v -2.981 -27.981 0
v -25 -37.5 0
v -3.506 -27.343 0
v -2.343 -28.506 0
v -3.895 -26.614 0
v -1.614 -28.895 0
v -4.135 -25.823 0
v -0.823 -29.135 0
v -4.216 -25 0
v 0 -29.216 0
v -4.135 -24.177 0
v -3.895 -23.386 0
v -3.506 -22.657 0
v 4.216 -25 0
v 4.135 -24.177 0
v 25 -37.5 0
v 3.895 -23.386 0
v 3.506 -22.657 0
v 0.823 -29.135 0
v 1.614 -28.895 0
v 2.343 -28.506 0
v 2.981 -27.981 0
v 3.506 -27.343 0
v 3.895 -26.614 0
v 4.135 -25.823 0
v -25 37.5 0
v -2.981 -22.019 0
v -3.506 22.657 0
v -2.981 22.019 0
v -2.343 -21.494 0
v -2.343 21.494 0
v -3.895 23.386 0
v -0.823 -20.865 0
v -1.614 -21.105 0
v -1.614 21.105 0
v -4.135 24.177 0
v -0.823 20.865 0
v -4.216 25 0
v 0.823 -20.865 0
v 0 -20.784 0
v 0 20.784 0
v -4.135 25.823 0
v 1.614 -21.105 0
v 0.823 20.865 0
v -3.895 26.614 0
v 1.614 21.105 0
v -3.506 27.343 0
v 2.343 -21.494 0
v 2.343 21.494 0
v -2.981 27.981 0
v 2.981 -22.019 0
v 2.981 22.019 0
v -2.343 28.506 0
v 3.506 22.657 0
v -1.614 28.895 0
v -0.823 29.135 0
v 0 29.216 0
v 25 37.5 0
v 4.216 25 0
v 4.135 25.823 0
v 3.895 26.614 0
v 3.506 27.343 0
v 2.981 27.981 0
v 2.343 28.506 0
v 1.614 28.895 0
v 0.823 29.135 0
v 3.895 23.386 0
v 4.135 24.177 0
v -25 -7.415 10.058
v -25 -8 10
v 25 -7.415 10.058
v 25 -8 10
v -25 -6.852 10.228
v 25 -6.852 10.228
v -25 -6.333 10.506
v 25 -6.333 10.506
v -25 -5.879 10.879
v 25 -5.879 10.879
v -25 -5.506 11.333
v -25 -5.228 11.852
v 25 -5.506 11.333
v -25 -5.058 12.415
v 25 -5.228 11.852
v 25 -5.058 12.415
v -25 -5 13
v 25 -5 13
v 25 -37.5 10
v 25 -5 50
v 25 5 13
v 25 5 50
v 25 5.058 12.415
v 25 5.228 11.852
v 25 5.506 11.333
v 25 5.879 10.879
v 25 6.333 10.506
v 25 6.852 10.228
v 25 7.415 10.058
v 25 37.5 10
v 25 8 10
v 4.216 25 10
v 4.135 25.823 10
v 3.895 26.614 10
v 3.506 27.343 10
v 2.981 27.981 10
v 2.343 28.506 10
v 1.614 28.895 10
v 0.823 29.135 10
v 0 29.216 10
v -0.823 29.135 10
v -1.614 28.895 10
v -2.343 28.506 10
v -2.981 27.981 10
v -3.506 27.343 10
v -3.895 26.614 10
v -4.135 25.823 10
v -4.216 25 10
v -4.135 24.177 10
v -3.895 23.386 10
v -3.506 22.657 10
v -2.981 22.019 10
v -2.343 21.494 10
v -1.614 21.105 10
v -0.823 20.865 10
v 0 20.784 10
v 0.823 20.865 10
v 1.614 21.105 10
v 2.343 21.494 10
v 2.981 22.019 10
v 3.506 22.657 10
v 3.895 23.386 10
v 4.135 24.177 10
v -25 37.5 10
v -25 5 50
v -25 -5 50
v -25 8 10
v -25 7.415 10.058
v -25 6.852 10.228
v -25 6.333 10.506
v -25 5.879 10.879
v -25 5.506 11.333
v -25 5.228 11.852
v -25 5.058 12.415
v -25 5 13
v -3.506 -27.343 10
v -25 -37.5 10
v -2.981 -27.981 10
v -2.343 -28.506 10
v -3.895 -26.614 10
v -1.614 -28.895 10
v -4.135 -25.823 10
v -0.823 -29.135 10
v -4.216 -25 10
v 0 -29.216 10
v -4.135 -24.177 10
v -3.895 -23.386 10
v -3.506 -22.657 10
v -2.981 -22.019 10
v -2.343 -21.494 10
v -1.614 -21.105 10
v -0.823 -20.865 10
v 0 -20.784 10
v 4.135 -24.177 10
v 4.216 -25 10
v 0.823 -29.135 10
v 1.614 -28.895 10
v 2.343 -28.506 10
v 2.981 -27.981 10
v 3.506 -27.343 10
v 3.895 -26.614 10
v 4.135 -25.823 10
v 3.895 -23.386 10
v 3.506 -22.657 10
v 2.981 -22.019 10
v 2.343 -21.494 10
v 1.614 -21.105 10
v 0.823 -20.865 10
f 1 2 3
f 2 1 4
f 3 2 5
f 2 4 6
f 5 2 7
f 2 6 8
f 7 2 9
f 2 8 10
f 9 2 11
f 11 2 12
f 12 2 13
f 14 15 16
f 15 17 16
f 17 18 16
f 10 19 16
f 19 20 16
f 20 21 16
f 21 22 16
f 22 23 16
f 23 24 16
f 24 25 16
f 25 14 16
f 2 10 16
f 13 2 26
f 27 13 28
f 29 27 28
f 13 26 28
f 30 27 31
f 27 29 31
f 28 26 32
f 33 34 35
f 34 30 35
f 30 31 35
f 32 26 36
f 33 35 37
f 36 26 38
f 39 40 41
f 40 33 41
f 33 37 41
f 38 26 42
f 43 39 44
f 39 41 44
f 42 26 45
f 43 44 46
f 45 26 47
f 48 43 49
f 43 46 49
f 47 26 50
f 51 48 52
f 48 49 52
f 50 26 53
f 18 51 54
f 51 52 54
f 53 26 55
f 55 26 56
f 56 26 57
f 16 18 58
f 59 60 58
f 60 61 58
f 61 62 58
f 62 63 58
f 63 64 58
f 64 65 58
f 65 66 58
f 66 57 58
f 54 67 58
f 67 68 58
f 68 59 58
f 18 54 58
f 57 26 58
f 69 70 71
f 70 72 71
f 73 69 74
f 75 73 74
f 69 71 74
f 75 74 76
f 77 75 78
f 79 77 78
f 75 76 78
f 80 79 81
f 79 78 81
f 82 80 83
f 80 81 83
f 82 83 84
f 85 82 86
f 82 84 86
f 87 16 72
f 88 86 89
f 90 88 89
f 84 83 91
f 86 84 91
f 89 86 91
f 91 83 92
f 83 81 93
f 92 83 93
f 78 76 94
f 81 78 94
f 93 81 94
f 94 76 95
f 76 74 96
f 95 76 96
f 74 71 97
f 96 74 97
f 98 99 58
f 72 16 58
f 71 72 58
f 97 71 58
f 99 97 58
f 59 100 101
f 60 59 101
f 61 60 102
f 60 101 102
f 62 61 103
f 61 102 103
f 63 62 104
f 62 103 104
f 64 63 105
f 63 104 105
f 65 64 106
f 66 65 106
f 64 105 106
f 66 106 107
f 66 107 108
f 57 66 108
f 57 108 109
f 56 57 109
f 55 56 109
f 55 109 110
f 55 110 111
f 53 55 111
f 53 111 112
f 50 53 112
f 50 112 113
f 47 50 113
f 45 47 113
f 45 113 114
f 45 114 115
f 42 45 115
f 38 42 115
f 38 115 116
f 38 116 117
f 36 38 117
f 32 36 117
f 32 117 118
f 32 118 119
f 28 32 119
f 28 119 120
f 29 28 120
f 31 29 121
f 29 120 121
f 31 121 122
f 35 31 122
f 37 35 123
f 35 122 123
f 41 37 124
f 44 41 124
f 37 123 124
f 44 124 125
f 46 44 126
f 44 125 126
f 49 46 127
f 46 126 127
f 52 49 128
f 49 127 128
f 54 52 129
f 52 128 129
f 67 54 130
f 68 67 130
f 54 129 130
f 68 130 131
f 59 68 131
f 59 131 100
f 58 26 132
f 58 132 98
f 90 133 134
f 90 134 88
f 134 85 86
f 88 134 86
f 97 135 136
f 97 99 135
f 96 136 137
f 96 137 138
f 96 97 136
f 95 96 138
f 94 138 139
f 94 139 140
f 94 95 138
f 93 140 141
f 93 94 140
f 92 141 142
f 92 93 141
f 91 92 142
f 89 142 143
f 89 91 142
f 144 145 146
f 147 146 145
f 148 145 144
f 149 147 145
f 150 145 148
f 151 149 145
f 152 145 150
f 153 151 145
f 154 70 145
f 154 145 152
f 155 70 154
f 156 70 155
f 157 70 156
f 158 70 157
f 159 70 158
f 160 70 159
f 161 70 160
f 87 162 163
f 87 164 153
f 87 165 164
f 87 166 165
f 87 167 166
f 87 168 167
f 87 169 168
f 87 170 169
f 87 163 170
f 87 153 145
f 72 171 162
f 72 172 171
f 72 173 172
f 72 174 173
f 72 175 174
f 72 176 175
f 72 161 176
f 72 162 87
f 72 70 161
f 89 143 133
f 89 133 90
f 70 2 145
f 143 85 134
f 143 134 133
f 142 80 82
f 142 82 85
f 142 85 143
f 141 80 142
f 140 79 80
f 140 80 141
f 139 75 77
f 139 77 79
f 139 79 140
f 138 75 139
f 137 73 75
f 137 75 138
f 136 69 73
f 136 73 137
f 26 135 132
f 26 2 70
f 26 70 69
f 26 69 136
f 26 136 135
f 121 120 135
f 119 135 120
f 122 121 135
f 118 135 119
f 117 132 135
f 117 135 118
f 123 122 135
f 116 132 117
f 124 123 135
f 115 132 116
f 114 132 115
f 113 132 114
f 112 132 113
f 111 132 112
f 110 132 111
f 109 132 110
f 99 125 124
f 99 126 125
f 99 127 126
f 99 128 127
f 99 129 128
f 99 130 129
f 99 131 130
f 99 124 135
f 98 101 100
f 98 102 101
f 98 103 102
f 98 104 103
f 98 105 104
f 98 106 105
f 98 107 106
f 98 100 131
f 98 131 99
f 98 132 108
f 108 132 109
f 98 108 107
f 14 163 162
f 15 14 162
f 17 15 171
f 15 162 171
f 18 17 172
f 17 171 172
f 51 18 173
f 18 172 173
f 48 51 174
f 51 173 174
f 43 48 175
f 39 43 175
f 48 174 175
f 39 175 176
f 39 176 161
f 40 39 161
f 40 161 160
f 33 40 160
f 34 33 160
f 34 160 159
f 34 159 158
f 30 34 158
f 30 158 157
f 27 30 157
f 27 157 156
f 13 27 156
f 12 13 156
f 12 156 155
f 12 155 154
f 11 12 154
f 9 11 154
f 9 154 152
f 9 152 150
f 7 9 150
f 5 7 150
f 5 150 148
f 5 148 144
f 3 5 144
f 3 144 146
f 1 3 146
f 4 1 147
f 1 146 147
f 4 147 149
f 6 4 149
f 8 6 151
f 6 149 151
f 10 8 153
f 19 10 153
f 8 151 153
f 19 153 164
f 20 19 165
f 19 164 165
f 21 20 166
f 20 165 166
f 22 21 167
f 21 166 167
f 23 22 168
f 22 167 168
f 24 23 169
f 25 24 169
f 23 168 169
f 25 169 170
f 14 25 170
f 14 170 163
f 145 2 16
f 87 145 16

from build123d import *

# Parameters (mm, degrees)
CROQUIS1_W                     = 50
CROQUIS1_H                     = 75
SALIENTE_EXTRUIR1_DEPTH        = 10
CROQUIS2_W                     = 50
CROQUIS2_H                     = 10
SALIENTE_EXTRUIR2_DEPTH        = 40
REDONDEO1_R                    = 3
TALADRO_DE_MARGEN_PARA_5_161_D = 8.4328


with BuildPart() as part:
    # Croquis1 → Saliente-Extruir1 (new body)
    with BuildSketch(Plane.XY):
        Rectangle(CROQUIS1_W, CROQUIS1_H)
    extrude(amount=SALIENTE_EXTRUIR1_DEPTH)

    # Croquis2 → Saliente-Extruir2 (add)
    with BuildSketch(Plane.XY.offset(10)):
        Rectangle(CROQUIS2_W, CROQUIS2_H)
    extrude(amount=SALIENTE_EXTRUIR2_DEPTH)

    # Redondeo1
    redondeo1_edges = [part.edges().sort_by_distance(p)[0] for p in [
        (0, -5, 10),
        (0, 5, 10),
    ]]
    fillet(redondeo1_edges, radius=REDONDEO1_R)

    # Taladro de margen para 5/161 (through all)
    with Locations(Plane(origin=(0, 25, 0), x_dir=(-1, 0, 0), z_dir=(0, 0, -1))):
        with Locations((0, 0), (0, -50)):
            Hole(TALADRO_DE_MARGEN_PARA_5_161_D / 2)


solid = part.part
